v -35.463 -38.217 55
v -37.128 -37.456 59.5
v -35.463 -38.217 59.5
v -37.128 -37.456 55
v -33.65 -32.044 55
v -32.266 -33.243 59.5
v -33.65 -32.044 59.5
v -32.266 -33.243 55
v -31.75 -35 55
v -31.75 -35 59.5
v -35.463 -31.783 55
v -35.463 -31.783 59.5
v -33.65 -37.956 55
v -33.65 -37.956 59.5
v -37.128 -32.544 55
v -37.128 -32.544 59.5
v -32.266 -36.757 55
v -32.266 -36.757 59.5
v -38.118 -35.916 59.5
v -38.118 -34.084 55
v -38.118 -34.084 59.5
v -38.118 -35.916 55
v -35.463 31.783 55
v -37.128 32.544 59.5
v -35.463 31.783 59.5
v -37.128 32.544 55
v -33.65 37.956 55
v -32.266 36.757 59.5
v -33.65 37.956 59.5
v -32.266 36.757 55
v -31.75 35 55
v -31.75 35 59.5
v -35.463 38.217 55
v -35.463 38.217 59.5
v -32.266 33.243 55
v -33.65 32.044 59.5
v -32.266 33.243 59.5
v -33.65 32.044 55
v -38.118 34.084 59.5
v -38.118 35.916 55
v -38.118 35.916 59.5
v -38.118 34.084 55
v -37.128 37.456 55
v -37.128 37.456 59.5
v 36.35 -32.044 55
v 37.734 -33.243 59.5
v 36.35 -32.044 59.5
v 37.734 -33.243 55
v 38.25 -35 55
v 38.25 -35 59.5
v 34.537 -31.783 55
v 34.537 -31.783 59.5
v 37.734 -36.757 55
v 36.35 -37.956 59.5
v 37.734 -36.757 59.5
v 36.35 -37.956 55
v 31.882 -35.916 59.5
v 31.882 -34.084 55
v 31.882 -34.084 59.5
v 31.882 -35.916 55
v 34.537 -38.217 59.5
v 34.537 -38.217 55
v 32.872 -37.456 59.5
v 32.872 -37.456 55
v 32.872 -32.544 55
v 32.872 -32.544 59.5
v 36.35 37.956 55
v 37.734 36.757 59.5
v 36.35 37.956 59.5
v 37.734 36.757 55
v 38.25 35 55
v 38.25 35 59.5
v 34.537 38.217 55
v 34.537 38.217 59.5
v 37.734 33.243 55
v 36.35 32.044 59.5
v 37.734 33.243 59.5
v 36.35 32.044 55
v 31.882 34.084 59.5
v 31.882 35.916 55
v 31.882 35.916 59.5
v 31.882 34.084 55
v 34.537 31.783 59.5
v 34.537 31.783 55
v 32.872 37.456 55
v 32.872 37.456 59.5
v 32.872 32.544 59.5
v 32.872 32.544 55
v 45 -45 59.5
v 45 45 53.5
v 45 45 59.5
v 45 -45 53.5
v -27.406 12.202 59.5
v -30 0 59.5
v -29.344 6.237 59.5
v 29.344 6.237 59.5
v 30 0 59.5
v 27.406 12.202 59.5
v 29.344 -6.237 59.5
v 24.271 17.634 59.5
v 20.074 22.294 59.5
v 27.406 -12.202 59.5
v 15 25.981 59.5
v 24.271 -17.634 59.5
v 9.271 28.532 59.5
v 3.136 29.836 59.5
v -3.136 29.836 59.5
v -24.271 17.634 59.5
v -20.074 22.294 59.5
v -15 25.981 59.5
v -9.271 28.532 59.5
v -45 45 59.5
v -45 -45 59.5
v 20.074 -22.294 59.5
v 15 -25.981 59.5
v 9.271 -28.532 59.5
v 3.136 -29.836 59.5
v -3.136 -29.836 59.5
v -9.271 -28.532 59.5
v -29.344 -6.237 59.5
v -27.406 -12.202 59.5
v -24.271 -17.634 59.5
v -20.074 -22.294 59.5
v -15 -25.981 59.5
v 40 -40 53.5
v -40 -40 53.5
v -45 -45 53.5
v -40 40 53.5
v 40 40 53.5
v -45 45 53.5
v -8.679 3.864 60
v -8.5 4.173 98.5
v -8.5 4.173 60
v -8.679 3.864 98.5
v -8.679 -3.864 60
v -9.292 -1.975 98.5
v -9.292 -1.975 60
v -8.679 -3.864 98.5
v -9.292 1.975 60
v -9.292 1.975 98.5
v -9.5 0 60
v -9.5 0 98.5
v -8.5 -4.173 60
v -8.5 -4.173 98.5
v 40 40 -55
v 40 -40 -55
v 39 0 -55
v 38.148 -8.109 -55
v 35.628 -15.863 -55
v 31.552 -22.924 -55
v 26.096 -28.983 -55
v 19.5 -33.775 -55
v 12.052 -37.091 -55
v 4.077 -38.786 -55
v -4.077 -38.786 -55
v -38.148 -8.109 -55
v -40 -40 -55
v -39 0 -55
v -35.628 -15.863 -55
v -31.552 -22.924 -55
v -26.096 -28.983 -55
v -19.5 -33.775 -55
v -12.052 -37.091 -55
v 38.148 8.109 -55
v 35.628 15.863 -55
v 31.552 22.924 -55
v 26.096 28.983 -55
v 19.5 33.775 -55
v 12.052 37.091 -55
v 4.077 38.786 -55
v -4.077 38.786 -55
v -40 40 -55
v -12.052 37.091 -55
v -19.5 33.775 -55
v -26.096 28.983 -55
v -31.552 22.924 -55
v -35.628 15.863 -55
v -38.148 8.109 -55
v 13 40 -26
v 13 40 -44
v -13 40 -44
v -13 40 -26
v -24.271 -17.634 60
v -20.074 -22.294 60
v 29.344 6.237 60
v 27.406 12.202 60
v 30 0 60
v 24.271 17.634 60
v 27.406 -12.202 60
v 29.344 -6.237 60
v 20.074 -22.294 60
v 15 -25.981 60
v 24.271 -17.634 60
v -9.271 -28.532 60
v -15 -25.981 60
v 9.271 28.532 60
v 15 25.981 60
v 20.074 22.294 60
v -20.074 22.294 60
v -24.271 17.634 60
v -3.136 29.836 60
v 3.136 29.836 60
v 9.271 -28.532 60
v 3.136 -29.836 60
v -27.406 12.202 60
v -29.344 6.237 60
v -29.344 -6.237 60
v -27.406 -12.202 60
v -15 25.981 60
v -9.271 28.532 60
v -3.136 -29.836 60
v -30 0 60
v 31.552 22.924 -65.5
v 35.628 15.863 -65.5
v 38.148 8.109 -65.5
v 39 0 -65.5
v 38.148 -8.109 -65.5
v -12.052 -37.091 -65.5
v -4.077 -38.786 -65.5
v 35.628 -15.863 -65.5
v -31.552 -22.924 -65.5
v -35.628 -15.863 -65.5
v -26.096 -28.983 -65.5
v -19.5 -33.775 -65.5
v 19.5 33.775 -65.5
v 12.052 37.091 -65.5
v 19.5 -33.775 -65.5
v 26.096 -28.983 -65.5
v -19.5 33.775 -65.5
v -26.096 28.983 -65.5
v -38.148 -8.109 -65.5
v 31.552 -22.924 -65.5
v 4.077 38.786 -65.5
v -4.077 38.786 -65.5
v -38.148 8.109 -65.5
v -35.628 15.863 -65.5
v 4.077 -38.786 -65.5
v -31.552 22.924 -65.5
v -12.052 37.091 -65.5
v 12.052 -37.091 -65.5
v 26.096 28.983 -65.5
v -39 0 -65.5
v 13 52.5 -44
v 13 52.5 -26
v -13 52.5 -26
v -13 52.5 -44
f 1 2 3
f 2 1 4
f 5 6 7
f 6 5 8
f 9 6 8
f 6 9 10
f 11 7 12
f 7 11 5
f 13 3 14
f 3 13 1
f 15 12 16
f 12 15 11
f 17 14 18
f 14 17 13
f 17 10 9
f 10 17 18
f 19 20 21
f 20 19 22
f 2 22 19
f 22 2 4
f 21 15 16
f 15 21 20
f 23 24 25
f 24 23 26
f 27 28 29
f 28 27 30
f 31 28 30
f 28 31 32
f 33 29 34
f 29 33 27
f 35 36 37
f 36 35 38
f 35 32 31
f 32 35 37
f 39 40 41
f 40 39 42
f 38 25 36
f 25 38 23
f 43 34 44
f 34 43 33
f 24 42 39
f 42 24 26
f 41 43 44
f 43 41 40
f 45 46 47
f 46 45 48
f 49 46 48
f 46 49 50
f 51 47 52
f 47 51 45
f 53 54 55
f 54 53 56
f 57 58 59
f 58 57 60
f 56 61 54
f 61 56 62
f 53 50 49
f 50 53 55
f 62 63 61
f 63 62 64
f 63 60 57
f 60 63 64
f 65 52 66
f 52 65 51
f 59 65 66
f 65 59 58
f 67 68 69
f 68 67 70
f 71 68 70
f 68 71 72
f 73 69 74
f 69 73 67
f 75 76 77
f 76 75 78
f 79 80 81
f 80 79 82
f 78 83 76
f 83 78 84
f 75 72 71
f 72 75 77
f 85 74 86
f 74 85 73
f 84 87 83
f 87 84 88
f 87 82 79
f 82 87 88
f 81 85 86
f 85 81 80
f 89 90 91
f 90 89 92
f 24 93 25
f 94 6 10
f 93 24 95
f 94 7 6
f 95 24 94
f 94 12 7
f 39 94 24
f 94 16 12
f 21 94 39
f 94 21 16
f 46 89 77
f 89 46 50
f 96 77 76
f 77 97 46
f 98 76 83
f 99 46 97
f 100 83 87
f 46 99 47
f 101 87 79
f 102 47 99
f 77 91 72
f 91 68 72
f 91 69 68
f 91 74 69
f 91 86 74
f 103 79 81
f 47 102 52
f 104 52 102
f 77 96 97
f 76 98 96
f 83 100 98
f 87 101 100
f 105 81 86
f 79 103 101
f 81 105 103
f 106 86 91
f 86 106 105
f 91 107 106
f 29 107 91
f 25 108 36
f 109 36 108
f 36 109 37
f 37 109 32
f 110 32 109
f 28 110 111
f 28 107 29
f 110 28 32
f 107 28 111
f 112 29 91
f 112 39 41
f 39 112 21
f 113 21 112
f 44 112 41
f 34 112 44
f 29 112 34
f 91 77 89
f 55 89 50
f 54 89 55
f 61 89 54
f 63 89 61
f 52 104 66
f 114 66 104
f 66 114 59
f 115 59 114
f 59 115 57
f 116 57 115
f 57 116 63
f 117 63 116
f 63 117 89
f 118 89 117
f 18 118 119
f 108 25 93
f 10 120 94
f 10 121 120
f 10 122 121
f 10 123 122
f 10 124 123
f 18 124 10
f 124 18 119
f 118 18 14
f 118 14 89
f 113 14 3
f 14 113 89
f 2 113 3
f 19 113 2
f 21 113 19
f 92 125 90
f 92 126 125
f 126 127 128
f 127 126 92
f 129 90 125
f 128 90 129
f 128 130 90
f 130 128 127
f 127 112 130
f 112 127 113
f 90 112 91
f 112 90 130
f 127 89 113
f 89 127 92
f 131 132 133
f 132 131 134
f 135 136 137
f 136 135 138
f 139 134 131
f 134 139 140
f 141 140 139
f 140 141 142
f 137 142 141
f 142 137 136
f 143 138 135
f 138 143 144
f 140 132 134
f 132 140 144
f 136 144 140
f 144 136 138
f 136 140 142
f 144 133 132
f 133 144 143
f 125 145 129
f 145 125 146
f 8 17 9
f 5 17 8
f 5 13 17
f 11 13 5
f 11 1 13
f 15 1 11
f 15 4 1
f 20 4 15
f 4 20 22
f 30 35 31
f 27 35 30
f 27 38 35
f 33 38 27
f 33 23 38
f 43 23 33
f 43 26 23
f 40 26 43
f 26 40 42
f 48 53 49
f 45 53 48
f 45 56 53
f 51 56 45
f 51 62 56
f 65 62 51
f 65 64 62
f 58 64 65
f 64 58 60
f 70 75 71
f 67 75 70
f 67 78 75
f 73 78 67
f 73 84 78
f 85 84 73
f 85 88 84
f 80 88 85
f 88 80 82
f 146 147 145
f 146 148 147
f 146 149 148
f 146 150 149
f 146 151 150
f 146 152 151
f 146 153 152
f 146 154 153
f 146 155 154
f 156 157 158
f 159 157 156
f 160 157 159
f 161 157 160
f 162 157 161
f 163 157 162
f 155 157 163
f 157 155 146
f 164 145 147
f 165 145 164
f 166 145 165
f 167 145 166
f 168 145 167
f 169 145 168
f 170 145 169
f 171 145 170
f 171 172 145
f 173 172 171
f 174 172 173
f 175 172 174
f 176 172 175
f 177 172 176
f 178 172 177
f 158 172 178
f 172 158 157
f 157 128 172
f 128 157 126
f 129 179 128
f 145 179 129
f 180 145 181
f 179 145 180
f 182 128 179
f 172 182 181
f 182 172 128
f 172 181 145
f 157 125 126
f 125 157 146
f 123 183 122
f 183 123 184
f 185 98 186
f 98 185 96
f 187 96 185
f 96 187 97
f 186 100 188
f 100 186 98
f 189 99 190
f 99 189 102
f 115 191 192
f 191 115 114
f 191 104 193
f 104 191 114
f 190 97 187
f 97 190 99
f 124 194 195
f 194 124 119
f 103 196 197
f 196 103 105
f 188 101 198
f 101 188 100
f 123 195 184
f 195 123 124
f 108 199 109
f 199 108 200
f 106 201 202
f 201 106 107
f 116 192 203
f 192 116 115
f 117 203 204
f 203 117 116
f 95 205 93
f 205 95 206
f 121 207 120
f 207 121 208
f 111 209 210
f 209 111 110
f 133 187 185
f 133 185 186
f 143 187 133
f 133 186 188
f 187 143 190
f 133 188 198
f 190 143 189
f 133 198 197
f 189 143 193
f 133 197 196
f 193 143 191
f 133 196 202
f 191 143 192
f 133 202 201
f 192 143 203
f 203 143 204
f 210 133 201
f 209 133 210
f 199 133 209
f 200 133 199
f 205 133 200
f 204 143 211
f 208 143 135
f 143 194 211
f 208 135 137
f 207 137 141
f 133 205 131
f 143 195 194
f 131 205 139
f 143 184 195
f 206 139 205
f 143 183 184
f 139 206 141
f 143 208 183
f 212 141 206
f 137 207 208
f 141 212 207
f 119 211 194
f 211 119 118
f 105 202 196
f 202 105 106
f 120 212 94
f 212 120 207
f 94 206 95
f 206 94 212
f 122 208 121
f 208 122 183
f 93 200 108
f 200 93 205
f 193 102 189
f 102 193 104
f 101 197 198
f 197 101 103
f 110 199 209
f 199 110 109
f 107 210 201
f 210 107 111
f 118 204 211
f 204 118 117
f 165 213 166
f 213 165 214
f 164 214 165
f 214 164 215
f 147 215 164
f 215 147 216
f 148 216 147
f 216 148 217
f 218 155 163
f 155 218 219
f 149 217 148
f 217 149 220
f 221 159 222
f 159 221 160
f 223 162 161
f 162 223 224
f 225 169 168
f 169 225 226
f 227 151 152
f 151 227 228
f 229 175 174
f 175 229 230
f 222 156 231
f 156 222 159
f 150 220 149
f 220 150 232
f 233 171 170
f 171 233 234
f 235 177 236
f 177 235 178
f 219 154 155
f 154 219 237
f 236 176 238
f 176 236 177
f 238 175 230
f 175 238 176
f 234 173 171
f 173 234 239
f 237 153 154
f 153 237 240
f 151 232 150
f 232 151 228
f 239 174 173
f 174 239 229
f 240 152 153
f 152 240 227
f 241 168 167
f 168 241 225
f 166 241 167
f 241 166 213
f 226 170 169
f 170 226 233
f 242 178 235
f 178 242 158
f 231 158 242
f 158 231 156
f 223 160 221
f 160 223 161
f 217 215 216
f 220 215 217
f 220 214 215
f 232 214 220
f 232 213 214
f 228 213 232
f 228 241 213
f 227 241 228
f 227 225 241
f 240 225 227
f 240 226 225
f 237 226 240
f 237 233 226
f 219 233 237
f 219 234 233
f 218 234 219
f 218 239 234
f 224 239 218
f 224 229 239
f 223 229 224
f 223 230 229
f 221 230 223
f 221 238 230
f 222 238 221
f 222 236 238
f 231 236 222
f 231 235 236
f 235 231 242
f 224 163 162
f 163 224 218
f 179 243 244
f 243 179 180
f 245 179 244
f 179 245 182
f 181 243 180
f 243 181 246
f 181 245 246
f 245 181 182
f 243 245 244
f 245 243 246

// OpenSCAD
// Parameters
motor_frame_size_mm = 80; //[40:160:1]
body_length_mm = 110; //[55:220:1]
body_corner_radius_mm = 2; //[0.5:6:0.5]
flange_size_mm = 90; //[70:140:1]
flange_thickness_mm = 6; //[3:15:1]
pilot_diameter_mm = 60; //[40:100:1]
pilot_height_mm = 2; //[1:6:0.5]
shaft_diameter_mm = 19; //[8:35:0.5]
shaft_length_mm = 40; //[15:80:1]
shaft_flat_width_mm = 16; //[8:30:0.5]
shaft_flat_depth_mm = 1.0; //[0.2:4:0.1]
mount_hole_diameter_mm = 6.5; //[3:12:0.1]
mount_hole_pitch_mm = 70; //[40:120:1]
rear_cap_diameter_mm = 78; //[50:140:1]
rear_cap_length_mm = 12; //[6:30:1]
connector_boss_width_mm = 26; //[12:60:1]
connector_boss_height_mm = 18; //[8:50:1]
connector_boss_depth_mm = 14; //[6:40:1]
connector_boss_offset_from_rear_mm = 20; //[5:60:1]
tolerance_clearance_mm = 0.2; //[0:1:0.05]
overlap_mm = 1.5; //[0.5:2:0.1]  // use 1-2mm overlap for robust unions

// Servo Motor - complete geometry (fixed connectivity)
module servo_motor() {
  // Precompute key faces (Z axis is motor length)
  body_front_z =  body_length_mm/2;
  body_rear_z  = -body_length_mm/2;

  // Flange: overlap into body by overlap_mm
  flange_back_z   = body_front_z - overlap_mm;
  flange_front_z  = flange_back_z + flange_thickness_mm;
  flange_center_z = (flange_back_z + flange_front_z)/2;

  // Pilot: overlap into flange by overlap_mm
  pilot_back_z   = flange_front_z - overlap_mm;
  pilot_front_z  = pilot_back_z + pilot_height_mm;
  pilot_center_z = (pilot_back_z + pilot_front_z)/2;

  // Shaft: overlap into pilot by overlap_mm (guarantees no gap at interface)
  shaft_back_z   = pilot_front_z - overlap_mm;
  shaft_front_z  = shaft_back_z + shaft_length_mm;
  shaft_center_z = (shaft_back_z + shaft_front_z)/2;

  // Rear cap: overlap into body by overlap_mm
  rearcap_front_z  = body_rear_z + overlap_mm;
  rearcap_back_z   = rearcap_front_z - rear_cap_length_mm;
  rear_center_z    = (rearcap_front_z + rearcap_back_z)/2;

  // Connector boss: overlap into +Y face by overlap_mm
  body_posY = motor_frame_size_mm/2;
  boss_minY = body_posY - overlap_mm;                 // boss -Y face inside body
  boss_center_y = boss_minY + connector_boss_depth_mm/2;

  // Keep original Z intent (offset from rear), but ensure it intersects body in Z too
  // Place boss center at requested offset, then clamp so it stays within body span.
  boss_center_z_raw = body_rear_z + connector_boss_offset_from_rear_mm;
  boss_half_h = connector_boss_height_mm/2;
  boss_center_z = min(body_front_z - boss_half_h + overlap_mm,
                  max(body_rear_z + boss_half_h - overlap_mm, boss_center_z_raw));

  color([0.15, 0.2, 0.35])
  union() {

    // --- Main body ---
    cube([motor_frame_size_mm, motor_frame_size_mm, body_length_mm], center=true);

    // --- Front flange (with mounting holes) ---
    difference() {
      translate([0, 0, flange_center_z])
        cube([flange_size_mm, flange_size_mm, flange_thickness_mm], center=true);

      for (x = [-mount_hole_pitch_mm/2, mount_hole_pitch_mm/2])
        for (y = [-mount_hole_pitch_mm/2, mount_hole_pitch_mm/2])
          translate([x, y, flange_center_z])
            cylinder(r=mount_hole_diameter_mm/2,
                     h=flange_thickness_mm + pilot_height_mm + overlap_mm*6,
                     center=true);
    }

    // --- Front pilot (register) ---
    translate([0, 0, pilot_center_z])
      cylinder(r=pilot_diameter_mm/2, h=pilot_height_mm, center=true);

    // --- Output shaft with flat (FORCED to be attached via overlap into pilot) ---
    // This fixes the reported floating/disconnected thin central rod by ensuring
    // the shaft back face penetrates the pilot by overlap_mm.
    difference() {
      translate([0, 0, shaft_center_z])
        cylinder(r=shaft_diameter_mm/2, h=shaft_length_mm, center=true);

      // Flat cut
      translate([shaft_diameter_mm/2 + shaft_flat_depth_mm, 0, shaft_center_z])
        cube([shaft_diameter_mm*2, shaft_diameter_mm*2, shaft_length_mm + overlap_mm*4], center=true);
    }

    // --- Rear cap ---
    translate([0, 0, rear_center_z])
      cylinder(r=rear_cap_diameter_mm/2, h=rear_cap_length_mm, center=true);

    // --- Cable connector boss ---
    translate([0, boss_center_y, boss_center_z])
      cube([connector_boss_width_mm, connector_boss_depth_mm, connector_boss_height_mm], center=true);
  }
}

// Assembly
module assembly() {
  servo_motor();
}

assembly();
